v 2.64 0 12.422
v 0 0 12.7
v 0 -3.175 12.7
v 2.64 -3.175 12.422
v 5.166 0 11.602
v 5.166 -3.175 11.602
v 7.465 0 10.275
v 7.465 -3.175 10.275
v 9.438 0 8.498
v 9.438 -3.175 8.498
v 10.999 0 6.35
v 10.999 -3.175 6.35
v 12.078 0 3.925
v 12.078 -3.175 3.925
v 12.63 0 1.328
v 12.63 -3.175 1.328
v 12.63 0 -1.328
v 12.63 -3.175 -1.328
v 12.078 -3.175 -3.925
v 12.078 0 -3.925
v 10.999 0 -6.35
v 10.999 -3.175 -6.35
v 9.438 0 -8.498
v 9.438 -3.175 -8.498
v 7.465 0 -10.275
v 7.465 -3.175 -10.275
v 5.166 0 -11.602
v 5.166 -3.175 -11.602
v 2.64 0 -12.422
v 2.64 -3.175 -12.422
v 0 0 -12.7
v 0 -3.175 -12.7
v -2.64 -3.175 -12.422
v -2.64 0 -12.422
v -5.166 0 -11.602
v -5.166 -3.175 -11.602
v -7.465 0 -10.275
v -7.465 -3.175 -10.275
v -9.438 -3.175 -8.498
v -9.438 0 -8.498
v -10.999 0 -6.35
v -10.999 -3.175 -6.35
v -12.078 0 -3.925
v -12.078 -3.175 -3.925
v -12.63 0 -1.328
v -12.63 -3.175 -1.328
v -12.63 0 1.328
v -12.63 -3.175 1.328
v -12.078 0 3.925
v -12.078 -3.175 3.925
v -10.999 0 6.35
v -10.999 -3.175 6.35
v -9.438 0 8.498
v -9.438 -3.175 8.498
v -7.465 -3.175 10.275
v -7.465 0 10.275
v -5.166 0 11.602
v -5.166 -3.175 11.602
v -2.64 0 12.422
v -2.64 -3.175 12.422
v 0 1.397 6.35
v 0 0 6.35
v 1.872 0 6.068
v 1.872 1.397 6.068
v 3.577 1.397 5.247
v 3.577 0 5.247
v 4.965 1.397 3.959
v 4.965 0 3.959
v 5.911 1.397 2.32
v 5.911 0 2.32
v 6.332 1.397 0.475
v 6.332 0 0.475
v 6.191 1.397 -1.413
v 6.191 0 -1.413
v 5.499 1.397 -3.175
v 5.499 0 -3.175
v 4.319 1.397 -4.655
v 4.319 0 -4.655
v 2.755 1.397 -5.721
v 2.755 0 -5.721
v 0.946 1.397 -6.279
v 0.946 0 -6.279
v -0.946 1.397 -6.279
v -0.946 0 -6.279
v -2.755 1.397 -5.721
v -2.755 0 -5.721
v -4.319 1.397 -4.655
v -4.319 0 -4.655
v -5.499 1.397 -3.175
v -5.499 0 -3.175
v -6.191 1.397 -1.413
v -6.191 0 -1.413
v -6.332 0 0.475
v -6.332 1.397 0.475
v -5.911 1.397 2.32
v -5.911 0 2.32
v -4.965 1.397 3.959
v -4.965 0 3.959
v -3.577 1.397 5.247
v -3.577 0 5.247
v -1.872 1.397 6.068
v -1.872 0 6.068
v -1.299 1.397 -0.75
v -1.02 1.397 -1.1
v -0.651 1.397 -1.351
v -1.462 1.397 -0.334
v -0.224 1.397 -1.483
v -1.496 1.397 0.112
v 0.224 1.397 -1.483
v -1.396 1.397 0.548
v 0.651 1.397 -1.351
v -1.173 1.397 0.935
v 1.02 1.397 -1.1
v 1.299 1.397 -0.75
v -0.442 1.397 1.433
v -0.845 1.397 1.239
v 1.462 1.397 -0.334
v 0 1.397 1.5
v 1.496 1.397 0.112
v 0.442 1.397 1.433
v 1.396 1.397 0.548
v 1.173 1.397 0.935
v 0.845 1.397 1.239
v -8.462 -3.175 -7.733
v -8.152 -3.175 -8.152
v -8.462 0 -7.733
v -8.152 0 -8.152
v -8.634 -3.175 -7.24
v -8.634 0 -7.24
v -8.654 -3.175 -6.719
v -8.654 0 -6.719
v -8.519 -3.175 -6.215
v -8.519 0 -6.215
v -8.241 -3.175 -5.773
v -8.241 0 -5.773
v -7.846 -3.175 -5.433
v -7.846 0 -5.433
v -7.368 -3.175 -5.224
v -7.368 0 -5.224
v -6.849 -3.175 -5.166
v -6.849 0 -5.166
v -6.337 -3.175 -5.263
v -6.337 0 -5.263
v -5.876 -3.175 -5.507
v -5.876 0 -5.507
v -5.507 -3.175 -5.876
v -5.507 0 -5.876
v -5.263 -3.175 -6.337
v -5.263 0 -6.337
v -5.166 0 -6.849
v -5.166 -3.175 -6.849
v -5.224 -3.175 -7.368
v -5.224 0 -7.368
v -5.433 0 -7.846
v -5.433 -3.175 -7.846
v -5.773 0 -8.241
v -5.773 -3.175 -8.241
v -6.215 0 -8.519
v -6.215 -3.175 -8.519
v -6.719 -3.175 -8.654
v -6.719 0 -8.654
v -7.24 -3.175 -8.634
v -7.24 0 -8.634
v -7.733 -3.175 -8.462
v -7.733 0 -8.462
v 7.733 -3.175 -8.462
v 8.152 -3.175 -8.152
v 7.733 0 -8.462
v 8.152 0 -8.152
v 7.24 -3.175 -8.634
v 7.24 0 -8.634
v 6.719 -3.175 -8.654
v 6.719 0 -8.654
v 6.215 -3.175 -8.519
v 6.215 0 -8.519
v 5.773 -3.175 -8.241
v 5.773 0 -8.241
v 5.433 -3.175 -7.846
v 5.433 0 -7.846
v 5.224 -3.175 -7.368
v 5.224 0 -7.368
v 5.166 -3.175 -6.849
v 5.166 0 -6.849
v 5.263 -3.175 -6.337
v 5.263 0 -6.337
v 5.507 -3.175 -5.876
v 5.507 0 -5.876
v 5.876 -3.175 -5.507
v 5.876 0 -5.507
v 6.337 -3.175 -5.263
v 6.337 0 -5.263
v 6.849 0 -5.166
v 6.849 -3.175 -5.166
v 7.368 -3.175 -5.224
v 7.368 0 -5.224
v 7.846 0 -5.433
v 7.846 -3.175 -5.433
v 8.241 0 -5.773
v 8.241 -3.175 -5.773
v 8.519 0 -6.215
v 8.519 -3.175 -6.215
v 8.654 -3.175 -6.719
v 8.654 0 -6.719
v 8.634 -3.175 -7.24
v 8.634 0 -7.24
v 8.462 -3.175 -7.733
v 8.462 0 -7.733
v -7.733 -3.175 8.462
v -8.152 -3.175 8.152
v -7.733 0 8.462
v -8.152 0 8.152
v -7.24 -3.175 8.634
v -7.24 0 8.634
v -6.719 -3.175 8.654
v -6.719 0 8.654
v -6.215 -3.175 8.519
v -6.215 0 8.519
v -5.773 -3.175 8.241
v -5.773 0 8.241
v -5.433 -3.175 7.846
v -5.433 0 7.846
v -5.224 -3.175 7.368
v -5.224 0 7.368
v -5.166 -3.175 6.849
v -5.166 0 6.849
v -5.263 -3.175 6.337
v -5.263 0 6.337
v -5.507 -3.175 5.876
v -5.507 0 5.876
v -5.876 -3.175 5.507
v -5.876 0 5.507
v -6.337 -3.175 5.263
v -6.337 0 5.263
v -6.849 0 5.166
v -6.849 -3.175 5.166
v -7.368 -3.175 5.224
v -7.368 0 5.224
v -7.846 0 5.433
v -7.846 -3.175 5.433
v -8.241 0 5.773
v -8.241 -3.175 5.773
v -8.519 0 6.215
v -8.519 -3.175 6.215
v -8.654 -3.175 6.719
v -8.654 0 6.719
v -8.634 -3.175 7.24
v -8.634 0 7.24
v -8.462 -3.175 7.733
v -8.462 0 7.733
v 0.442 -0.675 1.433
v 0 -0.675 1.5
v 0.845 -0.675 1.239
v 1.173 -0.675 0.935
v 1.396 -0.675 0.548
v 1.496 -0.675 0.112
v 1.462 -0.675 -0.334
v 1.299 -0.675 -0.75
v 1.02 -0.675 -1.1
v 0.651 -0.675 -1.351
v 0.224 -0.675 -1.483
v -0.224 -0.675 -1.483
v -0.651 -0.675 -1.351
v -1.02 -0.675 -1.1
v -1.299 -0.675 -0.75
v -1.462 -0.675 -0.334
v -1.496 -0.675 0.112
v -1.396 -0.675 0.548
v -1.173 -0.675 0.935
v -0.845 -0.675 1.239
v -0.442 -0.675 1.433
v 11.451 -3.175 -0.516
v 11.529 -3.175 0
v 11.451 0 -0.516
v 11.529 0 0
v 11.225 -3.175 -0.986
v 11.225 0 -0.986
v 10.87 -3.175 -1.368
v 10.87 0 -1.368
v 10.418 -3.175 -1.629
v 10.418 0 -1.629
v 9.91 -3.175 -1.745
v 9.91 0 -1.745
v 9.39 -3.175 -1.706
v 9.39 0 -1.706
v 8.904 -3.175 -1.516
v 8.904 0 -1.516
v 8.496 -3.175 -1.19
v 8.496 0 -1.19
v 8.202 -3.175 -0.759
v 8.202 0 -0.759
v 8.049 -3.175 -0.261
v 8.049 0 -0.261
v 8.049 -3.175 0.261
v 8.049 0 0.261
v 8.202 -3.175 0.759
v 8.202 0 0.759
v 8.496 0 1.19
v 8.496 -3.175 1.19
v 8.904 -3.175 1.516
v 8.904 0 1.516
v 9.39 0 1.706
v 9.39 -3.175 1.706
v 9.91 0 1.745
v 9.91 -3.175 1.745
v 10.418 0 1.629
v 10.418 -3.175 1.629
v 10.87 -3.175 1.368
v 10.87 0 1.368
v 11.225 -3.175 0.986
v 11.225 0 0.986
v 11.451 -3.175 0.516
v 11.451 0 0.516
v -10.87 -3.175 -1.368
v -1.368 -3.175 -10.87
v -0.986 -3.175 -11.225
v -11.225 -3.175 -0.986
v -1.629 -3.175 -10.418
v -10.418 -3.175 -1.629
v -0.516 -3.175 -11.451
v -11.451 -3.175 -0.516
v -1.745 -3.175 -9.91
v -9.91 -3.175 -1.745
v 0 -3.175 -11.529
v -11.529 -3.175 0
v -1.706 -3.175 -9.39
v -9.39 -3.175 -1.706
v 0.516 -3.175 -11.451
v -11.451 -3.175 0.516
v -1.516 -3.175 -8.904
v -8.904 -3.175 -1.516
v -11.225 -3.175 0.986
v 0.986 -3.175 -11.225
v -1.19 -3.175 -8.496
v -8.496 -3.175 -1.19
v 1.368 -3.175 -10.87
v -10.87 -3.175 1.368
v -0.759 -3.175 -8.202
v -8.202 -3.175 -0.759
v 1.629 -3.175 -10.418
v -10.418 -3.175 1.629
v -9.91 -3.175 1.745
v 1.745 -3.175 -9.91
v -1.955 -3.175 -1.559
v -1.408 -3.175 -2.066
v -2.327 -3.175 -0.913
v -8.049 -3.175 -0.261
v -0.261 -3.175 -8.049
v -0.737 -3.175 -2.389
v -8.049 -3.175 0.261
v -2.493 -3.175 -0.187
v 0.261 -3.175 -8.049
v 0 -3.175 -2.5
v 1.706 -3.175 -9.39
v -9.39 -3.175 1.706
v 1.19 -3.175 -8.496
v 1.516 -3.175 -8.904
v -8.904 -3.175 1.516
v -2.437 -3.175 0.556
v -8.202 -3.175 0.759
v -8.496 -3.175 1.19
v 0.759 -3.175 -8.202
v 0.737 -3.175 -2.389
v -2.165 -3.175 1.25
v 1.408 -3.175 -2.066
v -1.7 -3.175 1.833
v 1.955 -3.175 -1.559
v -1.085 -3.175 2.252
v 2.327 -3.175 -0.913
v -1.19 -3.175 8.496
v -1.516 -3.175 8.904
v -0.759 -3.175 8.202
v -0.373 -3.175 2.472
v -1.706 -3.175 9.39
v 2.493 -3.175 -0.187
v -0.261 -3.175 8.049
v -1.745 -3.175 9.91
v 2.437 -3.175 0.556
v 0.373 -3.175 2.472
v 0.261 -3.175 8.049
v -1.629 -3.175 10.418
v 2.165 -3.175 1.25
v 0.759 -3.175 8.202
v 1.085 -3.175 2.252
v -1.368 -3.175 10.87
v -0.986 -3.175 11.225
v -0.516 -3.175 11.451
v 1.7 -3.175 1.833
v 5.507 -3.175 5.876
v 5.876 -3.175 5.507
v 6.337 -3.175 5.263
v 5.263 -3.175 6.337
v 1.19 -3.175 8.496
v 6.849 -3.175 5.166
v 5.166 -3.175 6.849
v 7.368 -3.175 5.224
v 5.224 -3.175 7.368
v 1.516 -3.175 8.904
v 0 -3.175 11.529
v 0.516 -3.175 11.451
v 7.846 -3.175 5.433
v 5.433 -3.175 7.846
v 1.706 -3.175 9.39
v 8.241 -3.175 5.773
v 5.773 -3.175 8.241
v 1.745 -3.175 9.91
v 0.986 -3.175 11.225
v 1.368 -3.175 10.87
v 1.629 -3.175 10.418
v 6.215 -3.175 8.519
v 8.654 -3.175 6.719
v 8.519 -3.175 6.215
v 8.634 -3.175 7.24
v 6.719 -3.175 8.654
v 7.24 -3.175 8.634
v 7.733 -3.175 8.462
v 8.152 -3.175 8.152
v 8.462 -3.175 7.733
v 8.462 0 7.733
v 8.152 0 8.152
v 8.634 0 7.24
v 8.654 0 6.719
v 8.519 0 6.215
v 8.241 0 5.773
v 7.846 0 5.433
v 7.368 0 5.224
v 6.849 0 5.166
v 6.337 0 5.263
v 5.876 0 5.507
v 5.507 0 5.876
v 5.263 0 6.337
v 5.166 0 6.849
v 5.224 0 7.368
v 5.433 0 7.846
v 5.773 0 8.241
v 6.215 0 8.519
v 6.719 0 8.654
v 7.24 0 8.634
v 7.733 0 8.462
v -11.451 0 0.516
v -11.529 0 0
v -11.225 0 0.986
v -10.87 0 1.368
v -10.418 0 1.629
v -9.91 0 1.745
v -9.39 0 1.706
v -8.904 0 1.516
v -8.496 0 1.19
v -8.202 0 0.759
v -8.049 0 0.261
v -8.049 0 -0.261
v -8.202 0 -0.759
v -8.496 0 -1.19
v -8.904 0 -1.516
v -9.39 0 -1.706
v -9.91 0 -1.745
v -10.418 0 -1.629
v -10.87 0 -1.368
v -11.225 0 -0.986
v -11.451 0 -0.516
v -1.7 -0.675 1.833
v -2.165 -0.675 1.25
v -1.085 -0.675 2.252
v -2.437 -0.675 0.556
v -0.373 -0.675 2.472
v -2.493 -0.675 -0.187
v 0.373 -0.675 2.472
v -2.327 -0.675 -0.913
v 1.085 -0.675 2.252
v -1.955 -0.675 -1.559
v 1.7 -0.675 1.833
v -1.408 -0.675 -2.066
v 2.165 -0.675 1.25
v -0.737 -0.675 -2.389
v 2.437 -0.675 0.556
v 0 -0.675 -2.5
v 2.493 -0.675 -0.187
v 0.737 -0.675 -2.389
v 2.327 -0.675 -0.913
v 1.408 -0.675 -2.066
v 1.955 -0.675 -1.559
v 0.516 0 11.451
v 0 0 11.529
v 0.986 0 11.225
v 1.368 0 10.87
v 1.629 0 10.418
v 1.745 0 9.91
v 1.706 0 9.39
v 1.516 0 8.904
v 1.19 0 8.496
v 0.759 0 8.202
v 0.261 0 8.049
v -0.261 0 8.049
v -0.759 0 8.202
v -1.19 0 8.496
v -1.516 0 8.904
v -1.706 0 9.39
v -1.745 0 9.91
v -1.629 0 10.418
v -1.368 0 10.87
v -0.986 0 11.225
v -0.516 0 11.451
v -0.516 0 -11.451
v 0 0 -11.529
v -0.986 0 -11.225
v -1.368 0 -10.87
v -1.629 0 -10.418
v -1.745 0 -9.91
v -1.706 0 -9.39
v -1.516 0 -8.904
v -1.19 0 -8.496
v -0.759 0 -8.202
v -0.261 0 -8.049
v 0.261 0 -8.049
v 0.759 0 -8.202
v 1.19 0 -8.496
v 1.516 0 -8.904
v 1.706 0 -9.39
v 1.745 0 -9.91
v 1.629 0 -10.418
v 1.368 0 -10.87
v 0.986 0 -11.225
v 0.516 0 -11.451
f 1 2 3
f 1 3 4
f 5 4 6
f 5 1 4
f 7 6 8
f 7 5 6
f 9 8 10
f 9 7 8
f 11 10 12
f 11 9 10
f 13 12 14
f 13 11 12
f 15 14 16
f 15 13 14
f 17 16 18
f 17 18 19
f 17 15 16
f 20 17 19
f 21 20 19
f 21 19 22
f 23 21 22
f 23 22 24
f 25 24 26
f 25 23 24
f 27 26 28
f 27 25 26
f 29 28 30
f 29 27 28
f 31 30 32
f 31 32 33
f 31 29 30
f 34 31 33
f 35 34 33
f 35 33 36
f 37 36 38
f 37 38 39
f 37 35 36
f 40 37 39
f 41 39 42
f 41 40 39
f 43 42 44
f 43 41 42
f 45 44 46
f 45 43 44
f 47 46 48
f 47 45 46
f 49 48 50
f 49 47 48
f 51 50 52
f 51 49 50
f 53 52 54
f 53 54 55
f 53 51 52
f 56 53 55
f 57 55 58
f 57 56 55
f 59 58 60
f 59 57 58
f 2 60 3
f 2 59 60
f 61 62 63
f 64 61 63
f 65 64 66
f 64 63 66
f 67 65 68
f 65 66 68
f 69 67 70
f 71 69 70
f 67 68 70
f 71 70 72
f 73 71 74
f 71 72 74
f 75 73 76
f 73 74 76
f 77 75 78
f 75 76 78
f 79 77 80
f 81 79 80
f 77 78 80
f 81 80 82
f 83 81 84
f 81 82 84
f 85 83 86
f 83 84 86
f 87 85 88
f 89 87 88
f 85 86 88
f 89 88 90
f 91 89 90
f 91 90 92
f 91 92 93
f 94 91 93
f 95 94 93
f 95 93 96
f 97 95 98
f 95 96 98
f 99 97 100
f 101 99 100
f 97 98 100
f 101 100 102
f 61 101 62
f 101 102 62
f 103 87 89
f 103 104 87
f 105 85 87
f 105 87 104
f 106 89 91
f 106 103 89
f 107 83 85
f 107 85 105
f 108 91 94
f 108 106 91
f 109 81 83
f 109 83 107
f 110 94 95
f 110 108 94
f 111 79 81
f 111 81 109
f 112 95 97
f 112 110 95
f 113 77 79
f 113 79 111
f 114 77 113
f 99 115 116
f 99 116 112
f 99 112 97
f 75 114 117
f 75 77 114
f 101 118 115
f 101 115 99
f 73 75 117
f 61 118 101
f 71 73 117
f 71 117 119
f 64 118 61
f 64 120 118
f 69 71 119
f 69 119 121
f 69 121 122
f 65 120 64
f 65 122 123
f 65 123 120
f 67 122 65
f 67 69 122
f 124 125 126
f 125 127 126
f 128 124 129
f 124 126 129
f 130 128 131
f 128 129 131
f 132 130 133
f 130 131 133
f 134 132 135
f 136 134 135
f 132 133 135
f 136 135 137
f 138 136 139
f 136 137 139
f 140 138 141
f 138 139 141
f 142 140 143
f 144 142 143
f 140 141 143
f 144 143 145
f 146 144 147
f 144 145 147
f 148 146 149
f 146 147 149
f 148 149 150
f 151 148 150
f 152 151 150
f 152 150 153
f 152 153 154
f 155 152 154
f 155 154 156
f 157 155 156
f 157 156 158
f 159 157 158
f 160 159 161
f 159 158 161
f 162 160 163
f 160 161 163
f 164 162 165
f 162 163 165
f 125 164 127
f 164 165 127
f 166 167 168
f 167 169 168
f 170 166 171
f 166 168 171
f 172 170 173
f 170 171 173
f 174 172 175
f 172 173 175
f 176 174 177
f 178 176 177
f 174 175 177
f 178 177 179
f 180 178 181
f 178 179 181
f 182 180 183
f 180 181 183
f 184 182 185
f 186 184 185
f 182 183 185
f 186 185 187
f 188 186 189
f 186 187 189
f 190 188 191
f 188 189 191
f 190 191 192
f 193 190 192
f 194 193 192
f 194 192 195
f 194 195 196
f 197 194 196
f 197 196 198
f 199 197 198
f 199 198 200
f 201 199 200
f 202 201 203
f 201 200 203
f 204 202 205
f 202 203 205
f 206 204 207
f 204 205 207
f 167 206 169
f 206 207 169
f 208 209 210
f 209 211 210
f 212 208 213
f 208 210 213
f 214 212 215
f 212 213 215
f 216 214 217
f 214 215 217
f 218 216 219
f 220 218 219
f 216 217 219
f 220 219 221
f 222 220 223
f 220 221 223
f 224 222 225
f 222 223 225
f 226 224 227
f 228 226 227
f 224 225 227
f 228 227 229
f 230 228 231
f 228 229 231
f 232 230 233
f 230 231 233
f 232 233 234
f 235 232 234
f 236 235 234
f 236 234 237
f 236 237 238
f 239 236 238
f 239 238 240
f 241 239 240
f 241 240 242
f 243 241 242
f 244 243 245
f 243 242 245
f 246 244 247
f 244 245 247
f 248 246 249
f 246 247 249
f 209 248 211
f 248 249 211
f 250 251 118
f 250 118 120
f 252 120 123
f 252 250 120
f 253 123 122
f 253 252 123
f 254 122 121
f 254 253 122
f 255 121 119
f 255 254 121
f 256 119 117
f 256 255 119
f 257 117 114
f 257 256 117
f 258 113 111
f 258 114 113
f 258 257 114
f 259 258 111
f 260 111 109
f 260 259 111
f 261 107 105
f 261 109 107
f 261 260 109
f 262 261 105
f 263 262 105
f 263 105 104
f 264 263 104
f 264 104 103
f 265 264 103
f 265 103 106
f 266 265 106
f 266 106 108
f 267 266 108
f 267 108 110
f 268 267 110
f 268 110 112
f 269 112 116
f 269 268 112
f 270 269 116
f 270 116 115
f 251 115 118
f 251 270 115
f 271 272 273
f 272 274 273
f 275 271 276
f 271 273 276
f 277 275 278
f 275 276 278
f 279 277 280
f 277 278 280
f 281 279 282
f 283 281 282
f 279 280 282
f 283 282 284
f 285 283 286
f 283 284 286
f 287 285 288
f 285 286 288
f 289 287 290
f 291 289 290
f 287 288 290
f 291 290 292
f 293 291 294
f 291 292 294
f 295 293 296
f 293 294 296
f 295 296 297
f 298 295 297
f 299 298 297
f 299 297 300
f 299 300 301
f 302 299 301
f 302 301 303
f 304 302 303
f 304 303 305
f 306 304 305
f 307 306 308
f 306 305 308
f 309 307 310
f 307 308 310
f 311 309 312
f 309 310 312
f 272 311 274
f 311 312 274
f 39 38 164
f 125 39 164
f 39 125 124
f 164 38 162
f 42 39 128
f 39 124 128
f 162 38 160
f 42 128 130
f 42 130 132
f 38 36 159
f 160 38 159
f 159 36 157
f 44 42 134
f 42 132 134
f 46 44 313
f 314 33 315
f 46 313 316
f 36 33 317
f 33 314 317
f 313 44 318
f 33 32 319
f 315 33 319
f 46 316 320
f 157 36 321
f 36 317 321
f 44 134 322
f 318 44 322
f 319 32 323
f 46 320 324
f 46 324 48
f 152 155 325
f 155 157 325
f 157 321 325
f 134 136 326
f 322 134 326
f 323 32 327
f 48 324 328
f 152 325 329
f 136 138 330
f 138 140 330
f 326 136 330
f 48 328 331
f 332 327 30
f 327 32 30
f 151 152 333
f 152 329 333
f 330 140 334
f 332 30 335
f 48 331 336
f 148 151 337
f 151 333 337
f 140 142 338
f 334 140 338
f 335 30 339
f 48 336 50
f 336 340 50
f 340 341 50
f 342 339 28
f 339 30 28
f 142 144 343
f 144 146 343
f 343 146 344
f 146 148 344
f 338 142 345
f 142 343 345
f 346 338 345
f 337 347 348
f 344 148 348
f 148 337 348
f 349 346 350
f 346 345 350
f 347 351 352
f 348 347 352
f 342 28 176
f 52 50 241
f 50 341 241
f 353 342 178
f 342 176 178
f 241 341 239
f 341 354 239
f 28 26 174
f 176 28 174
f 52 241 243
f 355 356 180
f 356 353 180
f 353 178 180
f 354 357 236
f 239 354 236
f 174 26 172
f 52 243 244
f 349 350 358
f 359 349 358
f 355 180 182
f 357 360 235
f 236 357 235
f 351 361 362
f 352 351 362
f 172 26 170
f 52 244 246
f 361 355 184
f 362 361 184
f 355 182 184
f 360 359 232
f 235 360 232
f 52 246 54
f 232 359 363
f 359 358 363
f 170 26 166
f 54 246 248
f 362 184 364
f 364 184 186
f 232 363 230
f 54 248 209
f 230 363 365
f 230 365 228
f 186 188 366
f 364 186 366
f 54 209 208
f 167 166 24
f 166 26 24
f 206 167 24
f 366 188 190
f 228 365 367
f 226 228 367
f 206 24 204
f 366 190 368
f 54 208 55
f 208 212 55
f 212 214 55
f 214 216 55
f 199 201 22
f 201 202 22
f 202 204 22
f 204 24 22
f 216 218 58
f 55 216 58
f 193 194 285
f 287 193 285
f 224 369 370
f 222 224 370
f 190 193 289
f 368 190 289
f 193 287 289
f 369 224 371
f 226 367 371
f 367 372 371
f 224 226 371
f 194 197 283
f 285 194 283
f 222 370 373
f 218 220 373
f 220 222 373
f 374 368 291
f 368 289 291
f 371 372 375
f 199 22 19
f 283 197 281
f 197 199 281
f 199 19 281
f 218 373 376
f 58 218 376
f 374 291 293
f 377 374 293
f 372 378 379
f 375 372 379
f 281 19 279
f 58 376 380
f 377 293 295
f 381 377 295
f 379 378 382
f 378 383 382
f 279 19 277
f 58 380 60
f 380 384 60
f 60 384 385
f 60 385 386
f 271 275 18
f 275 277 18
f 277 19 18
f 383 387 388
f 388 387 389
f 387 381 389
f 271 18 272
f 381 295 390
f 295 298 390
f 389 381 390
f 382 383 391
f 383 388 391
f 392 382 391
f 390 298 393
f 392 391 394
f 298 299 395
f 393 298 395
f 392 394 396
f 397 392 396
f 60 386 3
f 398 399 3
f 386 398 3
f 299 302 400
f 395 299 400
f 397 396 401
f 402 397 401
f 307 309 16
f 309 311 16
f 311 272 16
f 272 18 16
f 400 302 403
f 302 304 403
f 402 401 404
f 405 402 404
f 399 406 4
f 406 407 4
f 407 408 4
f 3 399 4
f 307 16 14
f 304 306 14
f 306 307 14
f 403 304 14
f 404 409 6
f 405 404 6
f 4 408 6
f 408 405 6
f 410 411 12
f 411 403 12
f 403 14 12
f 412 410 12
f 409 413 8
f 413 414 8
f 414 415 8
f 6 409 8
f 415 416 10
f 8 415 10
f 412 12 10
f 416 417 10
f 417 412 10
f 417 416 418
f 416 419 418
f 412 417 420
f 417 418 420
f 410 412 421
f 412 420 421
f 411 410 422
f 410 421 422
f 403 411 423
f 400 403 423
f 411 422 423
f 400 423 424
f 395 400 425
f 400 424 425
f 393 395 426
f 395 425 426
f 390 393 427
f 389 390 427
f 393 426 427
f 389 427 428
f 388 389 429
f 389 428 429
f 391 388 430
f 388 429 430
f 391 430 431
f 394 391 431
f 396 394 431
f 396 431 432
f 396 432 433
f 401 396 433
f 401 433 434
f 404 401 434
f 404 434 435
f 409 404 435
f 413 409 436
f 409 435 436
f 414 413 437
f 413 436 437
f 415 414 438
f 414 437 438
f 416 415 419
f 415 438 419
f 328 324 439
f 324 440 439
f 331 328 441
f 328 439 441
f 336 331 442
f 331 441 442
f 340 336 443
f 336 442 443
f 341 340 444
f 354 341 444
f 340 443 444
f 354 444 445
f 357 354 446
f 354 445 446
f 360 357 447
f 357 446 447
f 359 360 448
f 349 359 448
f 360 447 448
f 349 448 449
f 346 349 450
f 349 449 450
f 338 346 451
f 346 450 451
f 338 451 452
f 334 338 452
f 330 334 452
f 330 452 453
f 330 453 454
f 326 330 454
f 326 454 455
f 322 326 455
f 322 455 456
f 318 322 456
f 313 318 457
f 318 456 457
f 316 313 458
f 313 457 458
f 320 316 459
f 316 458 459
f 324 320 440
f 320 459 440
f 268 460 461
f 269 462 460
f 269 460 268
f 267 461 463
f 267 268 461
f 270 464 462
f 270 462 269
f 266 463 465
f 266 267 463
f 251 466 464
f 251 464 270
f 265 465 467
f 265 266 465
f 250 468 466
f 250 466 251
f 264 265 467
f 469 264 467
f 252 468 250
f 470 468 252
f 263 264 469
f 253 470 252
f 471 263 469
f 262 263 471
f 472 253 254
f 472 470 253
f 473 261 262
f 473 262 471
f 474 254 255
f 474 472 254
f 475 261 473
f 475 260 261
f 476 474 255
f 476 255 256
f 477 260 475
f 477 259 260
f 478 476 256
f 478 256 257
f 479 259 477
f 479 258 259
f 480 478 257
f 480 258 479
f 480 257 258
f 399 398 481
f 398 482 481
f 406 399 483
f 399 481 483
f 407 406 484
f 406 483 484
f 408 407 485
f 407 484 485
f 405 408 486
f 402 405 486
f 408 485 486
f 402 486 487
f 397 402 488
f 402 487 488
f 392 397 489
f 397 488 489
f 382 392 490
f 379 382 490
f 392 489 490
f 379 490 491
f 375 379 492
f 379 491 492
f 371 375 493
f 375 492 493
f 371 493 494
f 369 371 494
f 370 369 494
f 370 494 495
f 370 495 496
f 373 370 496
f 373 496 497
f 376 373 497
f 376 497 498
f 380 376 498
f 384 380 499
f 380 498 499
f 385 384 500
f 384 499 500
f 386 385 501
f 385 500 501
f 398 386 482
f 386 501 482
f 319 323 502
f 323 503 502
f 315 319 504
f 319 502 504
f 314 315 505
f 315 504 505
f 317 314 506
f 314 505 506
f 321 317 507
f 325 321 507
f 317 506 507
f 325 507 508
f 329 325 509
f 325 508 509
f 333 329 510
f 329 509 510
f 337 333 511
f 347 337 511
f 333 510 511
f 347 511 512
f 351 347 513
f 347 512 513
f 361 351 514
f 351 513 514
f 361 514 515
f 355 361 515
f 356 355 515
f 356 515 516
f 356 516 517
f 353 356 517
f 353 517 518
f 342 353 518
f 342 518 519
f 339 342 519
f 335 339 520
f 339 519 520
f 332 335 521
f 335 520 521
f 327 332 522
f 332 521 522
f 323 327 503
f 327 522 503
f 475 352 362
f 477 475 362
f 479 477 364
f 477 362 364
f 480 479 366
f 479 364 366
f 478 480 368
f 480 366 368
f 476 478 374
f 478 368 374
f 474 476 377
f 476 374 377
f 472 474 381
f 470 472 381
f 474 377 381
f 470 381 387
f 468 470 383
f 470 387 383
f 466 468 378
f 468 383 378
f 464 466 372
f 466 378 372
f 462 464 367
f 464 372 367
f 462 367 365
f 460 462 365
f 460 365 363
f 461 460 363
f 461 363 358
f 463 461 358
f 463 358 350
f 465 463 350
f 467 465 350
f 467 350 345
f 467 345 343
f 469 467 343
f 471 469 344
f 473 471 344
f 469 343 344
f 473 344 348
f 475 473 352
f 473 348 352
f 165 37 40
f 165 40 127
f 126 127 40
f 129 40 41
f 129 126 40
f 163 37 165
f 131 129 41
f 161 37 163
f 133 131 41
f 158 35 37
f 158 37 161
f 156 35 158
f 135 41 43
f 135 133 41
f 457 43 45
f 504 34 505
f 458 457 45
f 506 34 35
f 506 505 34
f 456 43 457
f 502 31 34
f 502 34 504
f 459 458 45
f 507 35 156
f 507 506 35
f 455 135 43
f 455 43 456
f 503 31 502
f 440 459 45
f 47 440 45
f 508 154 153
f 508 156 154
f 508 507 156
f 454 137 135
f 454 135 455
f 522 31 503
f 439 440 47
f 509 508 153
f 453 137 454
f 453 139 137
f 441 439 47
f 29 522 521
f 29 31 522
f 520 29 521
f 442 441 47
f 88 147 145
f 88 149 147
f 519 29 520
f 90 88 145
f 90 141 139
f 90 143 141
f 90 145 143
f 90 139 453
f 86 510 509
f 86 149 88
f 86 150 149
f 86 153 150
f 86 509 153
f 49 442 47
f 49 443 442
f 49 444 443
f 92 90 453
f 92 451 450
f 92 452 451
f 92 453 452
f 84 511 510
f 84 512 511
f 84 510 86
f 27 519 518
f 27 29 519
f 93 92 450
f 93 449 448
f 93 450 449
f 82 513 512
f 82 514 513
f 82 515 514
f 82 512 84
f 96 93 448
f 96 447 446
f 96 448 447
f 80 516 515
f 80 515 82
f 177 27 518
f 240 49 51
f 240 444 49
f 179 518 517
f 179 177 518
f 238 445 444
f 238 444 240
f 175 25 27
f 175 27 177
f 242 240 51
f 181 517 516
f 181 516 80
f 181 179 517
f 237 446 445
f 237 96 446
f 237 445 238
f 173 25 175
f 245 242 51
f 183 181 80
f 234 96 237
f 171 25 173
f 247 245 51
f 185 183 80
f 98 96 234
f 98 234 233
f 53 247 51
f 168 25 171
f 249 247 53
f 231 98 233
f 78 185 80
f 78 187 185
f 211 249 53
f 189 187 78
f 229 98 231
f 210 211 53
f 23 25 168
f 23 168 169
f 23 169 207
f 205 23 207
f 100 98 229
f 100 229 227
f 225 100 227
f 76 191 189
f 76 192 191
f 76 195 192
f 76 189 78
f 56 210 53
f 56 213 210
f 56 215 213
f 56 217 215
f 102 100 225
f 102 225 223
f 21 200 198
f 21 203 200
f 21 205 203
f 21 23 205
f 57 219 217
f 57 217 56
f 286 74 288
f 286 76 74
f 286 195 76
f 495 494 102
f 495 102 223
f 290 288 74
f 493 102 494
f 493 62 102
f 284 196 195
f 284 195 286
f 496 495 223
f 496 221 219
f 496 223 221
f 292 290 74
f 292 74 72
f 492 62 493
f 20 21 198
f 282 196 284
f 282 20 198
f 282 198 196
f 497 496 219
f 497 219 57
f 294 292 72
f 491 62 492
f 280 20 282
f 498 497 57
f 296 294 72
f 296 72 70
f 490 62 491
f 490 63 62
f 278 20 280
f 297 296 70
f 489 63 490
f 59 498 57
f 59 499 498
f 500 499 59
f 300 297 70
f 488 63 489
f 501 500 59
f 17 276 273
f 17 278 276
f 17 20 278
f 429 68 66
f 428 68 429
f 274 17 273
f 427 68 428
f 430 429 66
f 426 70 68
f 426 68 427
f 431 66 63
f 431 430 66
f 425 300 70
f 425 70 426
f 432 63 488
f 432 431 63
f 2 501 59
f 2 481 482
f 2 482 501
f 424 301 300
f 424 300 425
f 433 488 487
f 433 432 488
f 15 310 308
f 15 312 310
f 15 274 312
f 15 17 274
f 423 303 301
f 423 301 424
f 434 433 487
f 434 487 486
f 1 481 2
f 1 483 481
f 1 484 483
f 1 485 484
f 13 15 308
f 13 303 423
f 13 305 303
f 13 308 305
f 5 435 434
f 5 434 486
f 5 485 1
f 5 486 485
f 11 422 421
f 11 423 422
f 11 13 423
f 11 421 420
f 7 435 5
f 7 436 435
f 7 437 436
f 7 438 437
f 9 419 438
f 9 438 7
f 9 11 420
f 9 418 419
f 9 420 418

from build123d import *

# Parameters (mm, degrees)
SKETCH1_R               = 12.7
BOSS_EXTRUDE1_DEPTH     = 3.175
SKETCH2_R               = 6.35
BOSS_EXTRUDE2_DEPTH     = 1.397
CUT_EXTRUDE1_DEPTH      = 19.533299329
CUT_EXTRUDE1_DEPTH_BACK = 19.533299329
SKETCH3_R               = 1.5
SKETCH4_R               = 1.75
CUT_EXTRUDE2_DEPTH      = 19.238986403
CIRPATTERN1_COUNT       = 8
SKETCH5_R               = 2.5
CUT_EXTRUDE3_DEPTH      = 2.5


with BuildPart() as part:
    # Sketch1 → Boss-Extrude1 (new body)
    with BuildSketch(Plane(origin=(0, 0, 0), x_dir=(1, 0, 0), z_dir=(0, 1, 0))):
        with Locations(Location((0, 0, 0), (0, 0, 270))):
            Circle(SKETCH1_R)
    extrude(amount=-BOSS_EXTRUDE1_DEPTH)

    # Sketch2 → Boss-Extrude2 (add)
    with BuildSketch(Plane(origin=(0, 0, 0), x_dir=(1, 0, 0), z_dir=(0, 1, 0))):
        with Locations(Location((0, 0, 0), (0, 0, 270))):
            Circle(SKETCH2_R)
    extrude(amount=BOSS_EXTRUDE2_DEPTH)

    # Sketch3 → Cut-Extrude1 (cut, two sides: drawn at the far end of the back side and taken through both)
    with BuildSketch(Plane(origin=(0, 1.397, 0), x_dir=(1, 0, 0), z_dir=(0, 1, 0)).offset(-CUT_EXTRUDE1_DEPTH_BACK)):
        with Locations(Location((0, 0, 0), (0, 0, 270))):
            Circle(SKETCH3_R)
    extrude(amount=CUT_EXTRUDE1_DEPTH + CUT_EXTRUDE1_DEPTH_BACK, mode=Mode.SUBTRACT)

    # Sketch4 → Cut-Extrude2 (cut, symmetric)
    with BuildSketch(Plane(origin=(0, 0, 0), x_dir=(1, 0, 0), z_dir=(0, 1, 0))):
        with Locations(Location((0, -9.779, 0), (0, 0, 270))):
            Circle(SKETCH4_R)
    cut_extrude2 = extrude(amount=CUT_EXTRUDE2_DEPTH, both=True, mode=Mode.SUBTRACT)

    # CirPattern1: Cut-Extrude2 ×8 about axis
    cirpattern1_axis = Axis((0, 0, 0), (0, 1, 0))
    for i in range(1, CIRPATTERN1_COUNT):
        add(cut_extrude2.rotate(cirpattern1_axis, i * 360 / CIRPATTERN1_COUNT), mode=Mode.SUBTRACT)

    # Sketch5 → Cut-Extrude3 (cut)
    with BuildSketch(Plane.XZ.offset(3.175)):
        with Locations(Location((0, 0, 0), (0, 0, 270))):
            Circle(SKETCH5_R)
    extrude(amount=-CUT_EXTRUDE3_DEPTH, mode=Mode.SUBTRACT)


solid = part.part
